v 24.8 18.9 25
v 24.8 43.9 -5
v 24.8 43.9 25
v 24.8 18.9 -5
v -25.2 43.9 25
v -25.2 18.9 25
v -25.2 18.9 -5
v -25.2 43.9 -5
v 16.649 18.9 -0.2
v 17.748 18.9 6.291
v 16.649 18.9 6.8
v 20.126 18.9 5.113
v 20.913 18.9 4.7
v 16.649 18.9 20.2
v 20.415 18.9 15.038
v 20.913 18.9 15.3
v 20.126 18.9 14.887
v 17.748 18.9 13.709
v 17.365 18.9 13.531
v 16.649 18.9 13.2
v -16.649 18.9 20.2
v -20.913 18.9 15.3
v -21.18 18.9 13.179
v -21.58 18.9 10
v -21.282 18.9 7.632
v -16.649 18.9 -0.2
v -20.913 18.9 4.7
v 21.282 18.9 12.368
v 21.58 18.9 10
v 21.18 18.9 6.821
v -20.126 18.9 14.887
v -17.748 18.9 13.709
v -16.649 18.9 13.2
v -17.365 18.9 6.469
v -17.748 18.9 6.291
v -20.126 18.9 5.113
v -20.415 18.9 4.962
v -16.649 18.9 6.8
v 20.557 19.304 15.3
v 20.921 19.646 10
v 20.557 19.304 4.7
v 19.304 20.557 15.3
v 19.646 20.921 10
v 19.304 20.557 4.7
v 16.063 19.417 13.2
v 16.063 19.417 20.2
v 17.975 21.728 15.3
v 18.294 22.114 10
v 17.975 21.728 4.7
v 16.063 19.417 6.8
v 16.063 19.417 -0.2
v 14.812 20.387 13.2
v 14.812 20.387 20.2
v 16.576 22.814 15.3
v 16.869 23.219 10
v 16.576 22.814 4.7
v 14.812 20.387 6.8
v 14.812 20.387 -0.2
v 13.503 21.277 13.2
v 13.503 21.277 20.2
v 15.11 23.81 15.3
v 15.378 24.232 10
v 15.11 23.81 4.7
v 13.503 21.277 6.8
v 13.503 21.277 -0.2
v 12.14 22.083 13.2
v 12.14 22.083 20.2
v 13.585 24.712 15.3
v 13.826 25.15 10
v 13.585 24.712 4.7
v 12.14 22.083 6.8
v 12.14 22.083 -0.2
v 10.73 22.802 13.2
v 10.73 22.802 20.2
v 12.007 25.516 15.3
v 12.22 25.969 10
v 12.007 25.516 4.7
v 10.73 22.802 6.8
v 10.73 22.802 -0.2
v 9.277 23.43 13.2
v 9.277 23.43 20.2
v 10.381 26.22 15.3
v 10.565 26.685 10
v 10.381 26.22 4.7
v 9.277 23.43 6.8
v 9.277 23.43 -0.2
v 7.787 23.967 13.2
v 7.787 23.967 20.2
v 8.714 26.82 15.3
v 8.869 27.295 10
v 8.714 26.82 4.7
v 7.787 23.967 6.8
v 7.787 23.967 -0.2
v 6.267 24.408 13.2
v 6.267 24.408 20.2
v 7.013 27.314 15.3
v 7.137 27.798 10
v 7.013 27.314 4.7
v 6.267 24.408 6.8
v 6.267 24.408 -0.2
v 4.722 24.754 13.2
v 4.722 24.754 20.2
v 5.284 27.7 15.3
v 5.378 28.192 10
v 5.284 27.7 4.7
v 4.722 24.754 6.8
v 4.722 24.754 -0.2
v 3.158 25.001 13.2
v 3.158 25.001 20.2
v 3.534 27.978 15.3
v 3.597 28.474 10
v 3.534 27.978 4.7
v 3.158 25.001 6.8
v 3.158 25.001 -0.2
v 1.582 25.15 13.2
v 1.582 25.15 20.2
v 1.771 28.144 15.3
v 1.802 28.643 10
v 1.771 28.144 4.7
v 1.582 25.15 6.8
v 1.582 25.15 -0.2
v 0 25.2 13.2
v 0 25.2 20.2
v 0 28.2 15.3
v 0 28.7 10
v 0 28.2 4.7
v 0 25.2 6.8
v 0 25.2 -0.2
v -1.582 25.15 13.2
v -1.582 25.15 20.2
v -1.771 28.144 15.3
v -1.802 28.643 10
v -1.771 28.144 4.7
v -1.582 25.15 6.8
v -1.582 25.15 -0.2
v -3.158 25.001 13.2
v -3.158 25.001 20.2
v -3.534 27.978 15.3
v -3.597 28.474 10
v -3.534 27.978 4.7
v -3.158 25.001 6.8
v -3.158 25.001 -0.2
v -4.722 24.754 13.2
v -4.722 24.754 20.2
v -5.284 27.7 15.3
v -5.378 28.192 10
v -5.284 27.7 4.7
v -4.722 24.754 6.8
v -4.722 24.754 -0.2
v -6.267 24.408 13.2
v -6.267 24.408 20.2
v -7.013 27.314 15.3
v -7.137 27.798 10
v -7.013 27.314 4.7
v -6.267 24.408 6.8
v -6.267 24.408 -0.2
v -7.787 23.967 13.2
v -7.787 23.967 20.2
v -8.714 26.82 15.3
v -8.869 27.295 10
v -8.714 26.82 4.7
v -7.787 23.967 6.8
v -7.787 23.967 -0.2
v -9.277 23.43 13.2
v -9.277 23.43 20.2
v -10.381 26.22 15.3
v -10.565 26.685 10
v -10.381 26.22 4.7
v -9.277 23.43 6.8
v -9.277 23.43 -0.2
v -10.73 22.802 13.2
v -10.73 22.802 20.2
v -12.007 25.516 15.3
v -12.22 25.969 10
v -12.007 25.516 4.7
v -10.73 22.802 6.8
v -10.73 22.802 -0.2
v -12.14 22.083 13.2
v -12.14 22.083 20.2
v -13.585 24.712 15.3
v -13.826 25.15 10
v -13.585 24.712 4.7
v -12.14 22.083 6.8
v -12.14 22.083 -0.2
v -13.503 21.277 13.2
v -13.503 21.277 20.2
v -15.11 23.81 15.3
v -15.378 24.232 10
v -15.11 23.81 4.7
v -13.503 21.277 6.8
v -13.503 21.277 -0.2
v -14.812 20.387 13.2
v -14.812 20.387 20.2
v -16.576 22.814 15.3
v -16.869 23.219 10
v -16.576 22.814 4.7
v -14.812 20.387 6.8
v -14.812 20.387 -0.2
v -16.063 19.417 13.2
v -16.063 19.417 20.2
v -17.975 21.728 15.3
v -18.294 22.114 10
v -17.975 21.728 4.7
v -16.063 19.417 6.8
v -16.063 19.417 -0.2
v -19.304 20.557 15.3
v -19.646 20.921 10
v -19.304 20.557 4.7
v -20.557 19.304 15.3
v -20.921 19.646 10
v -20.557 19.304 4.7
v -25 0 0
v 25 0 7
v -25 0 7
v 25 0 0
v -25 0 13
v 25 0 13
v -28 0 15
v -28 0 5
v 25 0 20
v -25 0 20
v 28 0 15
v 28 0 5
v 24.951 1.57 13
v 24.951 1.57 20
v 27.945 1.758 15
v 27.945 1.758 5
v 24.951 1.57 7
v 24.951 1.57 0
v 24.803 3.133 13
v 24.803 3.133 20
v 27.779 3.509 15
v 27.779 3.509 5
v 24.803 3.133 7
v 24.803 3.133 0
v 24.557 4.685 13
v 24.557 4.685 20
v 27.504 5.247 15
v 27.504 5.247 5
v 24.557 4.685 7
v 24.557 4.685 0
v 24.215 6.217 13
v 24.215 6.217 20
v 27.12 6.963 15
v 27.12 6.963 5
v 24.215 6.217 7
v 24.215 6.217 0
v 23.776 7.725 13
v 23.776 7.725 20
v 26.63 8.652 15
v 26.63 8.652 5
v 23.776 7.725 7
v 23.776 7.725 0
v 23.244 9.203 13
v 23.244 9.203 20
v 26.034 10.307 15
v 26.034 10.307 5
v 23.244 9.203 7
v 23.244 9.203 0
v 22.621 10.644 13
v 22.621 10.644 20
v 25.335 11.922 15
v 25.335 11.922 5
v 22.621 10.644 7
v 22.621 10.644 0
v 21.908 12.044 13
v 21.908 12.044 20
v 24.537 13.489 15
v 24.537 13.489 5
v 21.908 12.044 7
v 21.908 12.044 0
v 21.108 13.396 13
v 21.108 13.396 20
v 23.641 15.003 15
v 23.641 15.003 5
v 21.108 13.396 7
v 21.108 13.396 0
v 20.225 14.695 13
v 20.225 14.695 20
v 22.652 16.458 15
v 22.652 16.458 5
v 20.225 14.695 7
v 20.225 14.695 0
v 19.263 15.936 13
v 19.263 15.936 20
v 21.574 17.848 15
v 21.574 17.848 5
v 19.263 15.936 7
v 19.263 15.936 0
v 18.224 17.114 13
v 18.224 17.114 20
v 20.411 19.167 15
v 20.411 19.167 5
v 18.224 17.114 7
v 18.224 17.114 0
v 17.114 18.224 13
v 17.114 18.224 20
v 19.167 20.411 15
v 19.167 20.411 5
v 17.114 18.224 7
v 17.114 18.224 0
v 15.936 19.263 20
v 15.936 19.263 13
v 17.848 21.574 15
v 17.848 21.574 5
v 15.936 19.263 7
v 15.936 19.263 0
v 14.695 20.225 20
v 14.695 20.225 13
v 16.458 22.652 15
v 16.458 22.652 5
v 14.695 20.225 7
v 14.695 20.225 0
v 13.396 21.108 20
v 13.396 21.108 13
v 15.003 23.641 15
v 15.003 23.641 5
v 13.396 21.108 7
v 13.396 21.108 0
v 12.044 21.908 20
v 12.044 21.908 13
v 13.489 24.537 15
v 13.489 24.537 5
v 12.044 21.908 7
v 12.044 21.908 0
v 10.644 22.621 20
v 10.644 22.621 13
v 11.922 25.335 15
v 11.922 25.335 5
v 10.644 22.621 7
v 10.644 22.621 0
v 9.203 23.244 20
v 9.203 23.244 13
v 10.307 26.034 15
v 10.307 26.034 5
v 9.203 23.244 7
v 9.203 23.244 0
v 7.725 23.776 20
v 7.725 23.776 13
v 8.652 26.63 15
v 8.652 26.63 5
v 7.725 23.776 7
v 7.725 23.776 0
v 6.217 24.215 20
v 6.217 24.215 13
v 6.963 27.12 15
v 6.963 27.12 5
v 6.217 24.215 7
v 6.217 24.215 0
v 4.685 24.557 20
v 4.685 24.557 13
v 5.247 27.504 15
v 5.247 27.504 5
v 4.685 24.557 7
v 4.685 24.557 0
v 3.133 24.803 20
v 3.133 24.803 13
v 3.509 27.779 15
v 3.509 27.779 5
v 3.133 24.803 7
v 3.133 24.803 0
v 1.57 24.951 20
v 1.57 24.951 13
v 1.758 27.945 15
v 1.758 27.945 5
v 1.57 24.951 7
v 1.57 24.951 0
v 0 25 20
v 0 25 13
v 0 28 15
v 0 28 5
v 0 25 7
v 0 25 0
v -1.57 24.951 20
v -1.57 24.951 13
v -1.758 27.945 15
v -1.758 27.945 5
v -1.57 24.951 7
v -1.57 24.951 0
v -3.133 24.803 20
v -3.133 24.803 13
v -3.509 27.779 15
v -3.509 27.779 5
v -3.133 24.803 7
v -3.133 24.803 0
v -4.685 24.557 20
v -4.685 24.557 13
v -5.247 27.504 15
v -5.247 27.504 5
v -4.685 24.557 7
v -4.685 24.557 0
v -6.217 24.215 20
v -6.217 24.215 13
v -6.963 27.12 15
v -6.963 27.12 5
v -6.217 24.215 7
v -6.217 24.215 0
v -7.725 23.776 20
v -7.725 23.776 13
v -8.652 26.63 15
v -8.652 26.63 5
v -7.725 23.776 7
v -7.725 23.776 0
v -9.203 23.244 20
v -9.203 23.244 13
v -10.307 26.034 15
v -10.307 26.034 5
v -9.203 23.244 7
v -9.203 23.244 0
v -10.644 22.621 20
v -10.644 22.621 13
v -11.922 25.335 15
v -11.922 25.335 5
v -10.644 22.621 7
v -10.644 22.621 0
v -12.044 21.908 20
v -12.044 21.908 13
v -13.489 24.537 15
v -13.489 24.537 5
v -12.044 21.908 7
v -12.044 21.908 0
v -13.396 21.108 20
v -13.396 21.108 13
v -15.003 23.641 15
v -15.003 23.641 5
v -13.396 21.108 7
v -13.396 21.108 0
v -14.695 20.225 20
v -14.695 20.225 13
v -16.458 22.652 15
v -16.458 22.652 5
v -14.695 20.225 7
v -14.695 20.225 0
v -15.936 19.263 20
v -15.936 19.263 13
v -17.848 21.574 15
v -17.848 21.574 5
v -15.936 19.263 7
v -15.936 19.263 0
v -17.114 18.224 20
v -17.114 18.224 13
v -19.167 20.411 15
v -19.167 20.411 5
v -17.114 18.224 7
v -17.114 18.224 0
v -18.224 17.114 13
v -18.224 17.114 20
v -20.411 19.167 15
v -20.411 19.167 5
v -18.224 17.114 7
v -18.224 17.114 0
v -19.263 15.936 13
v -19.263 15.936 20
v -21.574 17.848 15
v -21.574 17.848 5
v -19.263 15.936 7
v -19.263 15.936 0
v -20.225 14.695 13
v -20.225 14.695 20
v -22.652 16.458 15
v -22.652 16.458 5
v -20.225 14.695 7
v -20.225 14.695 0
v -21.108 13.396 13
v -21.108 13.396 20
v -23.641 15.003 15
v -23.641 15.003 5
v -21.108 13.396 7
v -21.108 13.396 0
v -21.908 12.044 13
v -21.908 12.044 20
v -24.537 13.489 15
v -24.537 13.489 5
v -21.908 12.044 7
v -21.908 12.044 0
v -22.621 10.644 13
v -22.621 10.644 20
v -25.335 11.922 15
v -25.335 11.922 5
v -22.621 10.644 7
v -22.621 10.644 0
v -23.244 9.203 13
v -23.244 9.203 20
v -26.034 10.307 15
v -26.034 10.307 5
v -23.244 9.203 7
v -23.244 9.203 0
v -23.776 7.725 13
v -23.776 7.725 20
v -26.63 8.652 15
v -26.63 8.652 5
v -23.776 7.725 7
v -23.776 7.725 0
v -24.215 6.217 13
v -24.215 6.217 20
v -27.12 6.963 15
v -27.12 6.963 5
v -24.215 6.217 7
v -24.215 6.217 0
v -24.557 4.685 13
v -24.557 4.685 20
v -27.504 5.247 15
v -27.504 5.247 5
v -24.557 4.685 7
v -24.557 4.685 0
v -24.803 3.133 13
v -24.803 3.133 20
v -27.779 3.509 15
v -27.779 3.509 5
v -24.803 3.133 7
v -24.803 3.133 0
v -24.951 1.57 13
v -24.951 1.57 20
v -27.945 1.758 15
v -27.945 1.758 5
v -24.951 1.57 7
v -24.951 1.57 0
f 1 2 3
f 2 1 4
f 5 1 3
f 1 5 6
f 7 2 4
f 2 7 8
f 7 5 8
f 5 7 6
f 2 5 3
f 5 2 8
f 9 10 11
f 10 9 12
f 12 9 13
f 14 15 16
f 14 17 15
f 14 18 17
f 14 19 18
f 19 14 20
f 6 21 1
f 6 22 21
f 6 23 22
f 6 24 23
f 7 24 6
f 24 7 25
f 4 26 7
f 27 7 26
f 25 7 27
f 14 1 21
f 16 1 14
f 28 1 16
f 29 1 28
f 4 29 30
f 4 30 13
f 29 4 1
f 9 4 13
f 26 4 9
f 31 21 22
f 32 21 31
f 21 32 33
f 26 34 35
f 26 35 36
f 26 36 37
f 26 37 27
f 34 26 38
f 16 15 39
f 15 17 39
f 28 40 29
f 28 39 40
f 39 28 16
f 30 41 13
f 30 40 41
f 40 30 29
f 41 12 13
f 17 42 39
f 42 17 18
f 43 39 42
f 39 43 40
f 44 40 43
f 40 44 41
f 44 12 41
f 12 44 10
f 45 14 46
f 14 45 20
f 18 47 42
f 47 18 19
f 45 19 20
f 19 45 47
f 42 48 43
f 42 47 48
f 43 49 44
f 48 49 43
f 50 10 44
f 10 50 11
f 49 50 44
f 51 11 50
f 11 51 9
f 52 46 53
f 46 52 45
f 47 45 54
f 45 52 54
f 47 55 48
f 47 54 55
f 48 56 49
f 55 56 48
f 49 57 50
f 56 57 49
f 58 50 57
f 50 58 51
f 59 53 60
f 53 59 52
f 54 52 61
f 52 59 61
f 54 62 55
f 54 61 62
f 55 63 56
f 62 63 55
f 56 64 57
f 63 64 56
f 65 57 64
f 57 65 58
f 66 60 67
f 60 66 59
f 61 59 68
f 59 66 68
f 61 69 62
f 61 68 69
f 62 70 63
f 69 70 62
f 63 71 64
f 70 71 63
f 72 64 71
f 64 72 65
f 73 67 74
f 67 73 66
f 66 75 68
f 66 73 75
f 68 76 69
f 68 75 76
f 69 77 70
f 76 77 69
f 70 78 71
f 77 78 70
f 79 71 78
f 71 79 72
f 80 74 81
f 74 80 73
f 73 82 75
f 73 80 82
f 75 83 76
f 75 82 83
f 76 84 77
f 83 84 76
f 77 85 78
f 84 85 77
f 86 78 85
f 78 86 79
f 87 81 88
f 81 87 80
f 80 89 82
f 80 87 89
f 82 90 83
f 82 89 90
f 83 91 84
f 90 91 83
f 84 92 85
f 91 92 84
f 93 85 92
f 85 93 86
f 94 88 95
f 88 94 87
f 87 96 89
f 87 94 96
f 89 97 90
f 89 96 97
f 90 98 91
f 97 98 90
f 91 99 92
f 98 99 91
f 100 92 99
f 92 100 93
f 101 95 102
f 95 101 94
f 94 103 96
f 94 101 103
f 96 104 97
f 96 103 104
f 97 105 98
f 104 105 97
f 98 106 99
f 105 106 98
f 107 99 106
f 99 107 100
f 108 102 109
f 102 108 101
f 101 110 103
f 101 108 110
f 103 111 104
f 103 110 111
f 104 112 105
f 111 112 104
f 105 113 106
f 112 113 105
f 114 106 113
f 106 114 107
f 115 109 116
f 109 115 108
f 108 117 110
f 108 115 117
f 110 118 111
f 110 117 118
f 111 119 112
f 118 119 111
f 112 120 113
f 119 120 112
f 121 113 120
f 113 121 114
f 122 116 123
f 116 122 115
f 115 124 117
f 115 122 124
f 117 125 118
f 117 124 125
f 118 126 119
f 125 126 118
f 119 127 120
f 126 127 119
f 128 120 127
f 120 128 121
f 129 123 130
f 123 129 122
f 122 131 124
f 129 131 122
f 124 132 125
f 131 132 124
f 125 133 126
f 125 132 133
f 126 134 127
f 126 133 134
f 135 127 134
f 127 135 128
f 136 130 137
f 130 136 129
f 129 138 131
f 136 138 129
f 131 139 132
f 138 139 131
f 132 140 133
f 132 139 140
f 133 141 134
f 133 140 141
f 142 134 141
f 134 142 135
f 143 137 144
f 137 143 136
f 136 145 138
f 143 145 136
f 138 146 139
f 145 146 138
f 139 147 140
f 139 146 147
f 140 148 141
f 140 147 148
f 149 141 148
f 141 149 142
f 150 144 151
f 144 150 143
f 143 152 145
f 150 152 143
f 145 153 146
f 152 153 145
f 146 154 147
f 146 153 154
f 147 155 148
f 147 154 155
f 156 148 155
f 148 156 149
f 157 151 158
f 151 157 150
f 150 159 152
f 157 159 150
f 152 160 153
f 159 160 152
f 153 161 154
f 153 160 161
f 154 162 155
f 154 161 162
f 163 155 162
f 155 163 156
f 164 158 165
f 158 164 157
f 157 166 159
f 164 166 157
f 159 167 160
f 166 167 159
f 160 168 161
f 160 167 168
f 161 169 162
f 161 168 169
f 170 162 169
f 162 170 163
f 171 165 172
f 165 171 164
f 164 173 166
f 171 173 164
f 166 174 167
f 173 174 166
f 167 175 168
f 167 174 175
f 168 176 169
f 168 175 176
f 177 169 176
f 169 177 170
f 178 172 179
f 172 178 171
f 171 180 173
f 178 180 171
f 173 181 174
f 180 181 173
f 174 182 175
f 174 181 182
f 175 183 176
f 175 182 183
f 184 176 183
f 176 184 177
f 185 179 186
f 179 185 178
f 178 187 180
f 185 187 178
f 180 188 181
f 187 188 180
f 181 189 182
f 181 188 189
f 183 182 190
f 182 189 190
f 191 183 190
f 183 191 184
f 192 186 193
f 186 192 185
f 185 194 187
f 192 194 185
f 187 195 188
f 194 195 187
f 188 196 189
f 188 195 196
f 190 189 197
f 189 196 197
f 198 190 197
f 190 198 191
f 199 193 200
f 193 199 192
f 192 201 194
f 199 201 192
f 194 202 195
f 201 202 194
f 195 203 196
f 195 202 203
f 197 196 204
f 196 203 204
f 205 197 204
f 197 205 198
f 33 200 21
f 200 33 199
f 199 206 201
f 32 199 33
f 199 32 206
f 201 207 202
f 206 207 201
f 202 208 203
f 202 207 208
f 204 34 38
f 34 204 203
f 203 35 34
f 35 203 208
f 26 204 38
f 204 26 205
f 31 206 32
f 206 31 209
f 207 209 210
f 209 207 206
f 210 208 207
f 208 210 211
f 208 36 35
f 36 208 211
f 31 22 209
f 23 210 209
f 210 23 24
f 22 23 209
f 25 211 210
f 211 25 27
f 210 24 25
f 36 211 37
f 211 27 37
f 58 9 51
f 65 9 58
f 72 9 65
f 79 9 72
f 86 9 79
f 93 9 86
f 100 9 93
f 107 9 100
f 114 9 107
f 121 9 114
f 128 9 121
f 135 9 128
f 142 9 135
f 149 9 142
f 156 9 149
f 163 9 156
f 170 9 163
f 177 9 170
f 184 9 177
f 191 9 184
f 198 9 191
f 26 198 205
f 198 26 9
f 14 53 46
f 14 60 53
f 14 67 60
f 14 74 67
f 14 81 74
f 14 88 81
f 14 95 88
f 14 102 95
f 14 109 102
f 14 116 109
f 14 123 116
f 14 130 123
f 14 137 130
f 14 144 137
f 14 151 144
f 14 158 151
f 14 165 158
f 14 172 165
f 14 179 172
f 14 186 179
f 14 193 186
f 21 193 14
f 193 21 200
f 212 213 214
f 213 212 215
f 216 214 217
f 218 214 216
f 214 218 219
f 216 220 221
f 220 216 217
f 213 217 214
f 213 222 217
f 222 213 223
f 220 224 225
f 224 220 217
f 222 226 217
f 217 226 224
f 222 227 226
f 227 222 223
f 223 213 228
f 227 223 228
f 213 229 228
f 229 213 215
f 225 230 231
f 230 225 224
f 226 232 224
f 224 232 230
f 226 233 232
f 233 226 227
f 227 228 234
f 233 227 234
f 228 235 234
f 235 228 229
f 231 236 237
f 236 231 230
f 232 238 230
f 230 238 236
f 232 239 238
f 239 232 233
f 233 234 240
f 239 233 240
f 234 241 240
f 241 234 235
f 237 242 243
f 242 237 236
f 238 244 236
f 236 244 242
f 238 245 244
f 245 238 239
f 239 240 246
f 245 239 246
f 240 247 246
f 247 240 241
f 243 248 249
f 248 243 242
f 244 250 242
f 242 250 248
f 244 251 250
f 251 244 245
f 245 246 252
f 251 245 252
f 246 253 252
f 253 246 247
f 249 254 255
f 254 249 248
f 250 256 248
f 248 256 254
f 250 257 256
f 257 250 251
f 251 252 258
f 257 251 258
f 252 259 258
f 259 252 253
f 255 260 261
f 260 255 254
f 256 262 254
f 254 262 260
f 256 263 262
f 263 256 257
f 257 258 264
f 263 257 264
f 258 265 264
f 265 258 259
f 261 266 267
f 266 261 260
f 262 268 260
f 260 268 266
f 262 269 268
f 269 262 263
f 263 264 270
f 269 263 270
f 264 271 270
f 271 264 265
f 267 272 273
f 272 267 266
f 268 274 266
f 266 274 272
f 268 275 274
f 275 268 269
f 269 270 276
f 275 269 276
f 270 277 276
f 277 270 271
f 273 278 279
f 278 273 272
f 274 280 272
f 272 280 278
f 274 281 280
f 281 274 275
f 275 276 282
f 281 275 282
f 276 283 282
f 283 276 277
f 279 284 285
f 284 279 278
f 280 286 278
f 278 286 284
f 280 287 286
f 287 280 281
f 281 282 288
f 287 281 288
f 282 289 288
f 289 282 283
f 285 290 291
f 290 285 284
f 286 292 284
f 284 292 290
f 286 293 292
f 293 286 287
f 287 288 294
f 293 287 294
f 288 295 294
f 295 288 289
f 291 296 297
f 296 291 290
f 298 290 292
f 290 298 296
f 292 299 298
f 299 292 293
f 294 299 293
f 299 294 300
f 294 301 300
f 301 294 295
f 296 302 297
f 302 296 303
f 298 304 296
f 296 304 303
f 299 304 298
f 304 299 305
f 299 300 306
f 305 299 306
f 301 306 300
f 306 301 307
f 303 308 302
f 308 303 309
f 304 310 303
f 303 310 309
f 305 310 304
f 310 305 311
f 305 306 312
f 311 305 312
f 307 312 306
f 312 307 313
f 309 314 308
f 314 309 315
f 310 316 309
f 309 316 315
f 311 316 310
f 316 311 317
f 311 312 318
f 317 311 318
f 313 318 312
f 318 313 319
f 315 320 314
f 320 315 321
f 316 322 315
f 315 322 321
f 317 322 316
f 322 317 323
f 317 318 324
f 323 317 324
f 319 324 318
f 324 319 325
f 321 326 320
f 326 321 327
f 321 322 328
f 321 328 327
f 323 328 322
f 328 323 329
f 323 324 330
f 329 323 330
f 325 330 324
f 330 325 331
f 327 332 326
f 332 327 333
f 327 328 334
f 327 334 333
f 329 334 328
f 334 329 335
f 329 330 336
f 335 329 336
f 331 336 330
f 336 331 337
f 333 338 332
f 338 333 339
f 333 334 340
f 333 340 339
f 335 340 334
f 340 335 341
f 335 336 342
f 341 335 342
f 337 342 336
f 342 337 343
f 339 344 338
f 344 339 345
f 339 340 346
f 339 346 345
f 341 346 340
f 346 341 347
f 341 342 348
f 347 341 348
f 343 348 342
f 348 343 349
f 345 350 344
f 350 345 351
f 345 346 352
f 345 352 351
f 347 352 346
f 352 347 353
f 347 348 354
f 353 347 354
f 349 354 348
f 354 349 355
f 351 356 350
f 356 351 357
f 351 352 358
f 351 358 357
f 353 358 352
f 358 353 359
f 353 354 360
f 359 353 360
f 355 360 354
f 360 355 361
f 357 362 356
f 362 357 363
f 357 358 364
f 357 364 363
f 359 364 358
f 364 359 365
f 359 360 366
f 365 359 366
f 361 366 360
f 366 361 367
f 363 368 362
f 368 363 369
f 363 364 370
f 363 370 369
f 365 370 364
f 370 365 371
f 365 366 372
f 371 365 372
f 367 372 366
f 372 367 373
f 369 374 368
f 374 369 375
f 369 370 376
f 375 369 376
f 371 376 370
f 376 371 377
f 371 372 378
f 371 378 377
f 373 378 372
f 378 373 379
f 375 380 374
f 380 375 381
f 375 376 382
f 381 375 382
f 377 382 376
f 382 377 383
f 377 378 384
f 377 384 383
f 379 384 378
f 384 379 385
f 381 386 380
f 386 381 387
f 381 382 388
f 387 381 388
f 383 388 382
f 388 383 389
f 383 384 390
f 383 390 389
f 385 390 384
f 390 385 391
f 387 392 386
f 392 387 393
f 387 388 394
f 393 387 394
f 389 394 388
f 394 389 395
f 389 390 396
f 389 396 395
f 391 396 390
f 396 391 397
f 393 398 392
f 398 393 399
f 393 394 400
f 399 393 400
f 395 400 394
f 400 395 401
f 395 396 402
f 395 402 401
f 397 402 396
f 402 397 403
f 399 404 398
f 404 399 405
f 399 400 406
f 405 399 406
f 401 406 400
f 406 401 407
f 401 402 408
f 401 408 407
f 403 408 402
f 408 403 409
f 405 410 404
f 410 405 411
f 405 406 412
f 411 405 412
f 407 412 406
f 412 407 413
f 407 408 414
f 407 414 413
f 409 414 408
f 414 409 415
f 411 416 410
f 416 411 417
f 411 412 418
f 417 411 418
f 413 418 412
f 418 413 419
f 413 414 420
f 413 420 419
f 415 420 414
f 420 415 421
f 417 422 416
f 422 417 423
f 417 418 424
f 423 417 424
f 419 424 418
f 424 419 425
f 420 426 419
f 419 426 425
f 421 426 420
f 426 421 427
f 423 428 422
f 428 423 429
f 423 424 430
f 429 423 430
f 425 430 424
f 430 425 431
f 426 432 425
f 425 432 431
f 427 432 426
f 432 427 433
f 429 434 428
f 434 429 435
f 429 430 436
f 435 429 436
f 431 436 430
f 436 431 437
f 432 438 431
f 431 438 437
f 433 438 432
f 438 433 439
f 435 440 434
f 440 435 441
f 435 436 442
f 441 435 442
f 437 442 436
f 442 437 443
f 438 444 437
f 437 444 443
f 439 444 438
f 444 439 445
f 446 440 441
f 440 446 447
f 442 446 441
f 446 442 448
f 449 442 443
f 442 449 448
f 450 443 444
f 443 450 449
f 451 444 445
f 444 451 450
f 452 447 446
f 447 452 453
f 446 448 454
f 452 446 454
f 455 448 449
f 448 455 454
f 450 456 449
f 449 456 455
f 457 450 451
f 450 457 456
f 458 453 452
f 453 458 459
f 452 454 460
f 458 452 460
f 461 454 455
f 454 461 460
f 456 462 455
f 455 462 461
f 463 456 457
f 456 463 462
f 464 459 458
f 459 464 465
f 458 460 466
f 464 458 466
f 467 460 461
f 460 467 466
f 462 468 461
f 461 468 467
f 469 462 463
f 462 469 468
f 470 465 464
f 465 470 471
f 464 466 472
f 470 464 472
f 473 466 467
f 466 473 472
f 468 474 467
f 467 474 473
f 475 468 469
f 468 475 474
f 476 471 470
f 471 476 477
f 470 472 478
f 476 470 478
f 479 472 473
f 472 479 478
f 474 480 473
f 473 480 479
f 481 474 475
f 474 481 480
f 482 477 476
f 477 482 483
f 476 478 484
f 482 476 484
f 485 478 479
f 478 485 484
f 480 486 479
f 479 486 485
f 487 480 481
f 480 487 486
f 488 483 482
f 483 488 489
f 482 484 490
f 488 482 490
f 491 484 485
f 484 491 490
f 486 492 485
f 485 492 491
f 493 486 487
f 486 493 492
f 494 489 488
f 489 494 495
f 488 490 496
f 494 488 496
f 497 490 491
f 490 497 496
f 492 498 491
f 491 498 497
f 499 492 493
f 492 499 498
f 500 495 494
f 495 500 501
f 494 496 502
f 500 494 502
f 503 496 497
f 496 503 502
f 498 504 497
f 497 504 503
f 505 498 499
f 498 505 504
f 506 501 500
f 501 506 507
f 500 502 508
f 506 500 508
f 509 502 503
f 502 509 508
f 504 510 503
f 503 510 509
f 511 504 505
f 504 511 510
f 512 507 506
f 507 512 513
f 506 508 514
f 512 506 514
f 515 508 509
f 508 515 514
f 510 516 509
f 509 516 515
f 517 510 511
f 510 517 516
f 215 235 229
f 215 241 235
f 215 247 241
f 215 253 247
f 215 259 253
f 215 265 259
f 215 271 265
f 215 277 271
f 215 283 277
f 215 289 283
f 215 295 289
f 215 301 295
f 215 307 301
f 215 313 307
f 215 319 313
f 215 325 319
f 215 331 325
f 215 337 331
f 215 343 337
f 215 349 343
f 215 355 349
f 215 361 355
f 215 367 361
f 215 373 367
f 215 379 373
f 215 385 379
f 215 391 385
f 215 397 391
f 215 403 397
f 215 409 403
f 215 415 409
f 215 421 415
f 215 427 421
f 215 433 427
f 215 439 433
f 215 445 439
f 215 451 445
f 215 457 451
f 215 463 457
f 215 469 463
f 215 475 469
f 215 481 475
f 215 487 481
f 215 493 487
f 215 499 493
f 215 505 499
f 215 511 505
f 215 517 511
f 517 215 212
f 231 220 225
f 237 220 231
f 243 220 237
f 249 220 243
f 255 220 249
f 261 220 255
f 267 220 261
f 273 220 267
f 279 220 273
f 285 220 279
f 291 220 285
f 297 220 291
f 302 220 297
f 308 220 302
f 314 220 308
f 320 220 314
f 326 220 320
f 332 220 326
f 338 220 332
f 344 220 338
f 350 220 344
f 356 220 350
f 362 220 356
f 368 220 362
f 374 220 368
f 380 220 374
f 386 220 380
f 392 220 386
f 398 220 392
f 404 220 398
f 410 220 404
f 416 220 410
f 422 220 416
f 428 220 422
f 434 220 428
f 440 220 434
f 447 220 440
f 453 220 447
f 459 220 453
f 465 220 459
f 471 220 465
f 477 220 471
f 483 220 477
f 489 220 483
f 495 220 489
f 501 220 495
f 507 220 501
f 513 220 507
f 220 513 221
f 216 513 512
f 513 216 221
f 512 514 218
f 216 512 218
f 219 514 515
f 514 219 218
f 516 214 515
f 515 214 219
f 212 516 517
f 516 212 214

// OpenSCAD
$fn = 100;

SEGMENT_HT = 20;
TAIL_WD = 10;
TAIL_HT = 3;
TOOTH_BITE = 2;

segment_rad = 25;




rotating_segment_shape =[
    [0,0],
    [0,SEGMENT_HT],
    [segment_rad,           SEGMENT_HT],
    [segment_rad,           SEGMENT_HT/2 + (TAIL_WD/2 - TOOTH_BITE)],
    [segment_rad + TAIL_HT, SEGMENT_HT/2 + TAIL_WD/2],
    [segment_rad + TAIL_HT, SEGMENT_HT/2 - TAIL_WD/2],
    [segment_rad,           SEGMENT_HT/2 - (TAIL_WD/2 - TOOTH_BITE)],
    [segment_rad,0]
];


color("yellow",1.0){
    translate([0, 0, 0]){
        rotate_extrude(angle=180, convexity=10){
            polygon(rotating_segment_shape);
        }
    }
}


FAN_VERTICAL_OS = 0.1;
MAIN_OS = 0.2;
RADIUS_OS = 0.2;
BULGE_SZ = 0.5;
neg_segment_rad = segment_rad + RADIUS_OS;


negative_segment_shape = [
    [0,- MAIN_OS],
    [0,SEGMENT_HT + MAIN_OS],
    [neg_segment_rad,           SEGMENT_HT + MAIN_OS],
    [neg_segment_rad,           SEGMENT_HT/2 + (TAIL_WD/2 - TOOTH_BITE + MAIN_OS)],
    [neg_segment_rad + TAIL_HT, SEGMENT_HT/2 + TAIL_WD/2 + FAN_VERTICAL_OS+ MAIN_OS],
    [neg_segment_rad + TAIL_HT + BULGE_SZ, SEGMENT_HT/2],
    [neg_segment_rad + TAIL_HT, SEGMENT_HT/2 - TAIL_WD/2 - FAN_VERTICAL_OS - MAIN_OS],
    [neg_segment_rad,           SEGMENT_HT/2 - (TAIL_WD/2 - TOOTH_BITE + MAIN_OS)],
    [neg_segment_rad,- MAIN_OS]
];


difference(){
    translate([-neg_segment_rad, neg_segment_rad * 0.75, -(SEGMENT_HT *1.5)/6]){
        cube([2 * segment_rad, segment_rad, SEGMENT_HT *1.5], center=false);
    }
    rotate_extrude(angle=180, convexity=10){
        polygon(negative_segment_shape);
    }
}
